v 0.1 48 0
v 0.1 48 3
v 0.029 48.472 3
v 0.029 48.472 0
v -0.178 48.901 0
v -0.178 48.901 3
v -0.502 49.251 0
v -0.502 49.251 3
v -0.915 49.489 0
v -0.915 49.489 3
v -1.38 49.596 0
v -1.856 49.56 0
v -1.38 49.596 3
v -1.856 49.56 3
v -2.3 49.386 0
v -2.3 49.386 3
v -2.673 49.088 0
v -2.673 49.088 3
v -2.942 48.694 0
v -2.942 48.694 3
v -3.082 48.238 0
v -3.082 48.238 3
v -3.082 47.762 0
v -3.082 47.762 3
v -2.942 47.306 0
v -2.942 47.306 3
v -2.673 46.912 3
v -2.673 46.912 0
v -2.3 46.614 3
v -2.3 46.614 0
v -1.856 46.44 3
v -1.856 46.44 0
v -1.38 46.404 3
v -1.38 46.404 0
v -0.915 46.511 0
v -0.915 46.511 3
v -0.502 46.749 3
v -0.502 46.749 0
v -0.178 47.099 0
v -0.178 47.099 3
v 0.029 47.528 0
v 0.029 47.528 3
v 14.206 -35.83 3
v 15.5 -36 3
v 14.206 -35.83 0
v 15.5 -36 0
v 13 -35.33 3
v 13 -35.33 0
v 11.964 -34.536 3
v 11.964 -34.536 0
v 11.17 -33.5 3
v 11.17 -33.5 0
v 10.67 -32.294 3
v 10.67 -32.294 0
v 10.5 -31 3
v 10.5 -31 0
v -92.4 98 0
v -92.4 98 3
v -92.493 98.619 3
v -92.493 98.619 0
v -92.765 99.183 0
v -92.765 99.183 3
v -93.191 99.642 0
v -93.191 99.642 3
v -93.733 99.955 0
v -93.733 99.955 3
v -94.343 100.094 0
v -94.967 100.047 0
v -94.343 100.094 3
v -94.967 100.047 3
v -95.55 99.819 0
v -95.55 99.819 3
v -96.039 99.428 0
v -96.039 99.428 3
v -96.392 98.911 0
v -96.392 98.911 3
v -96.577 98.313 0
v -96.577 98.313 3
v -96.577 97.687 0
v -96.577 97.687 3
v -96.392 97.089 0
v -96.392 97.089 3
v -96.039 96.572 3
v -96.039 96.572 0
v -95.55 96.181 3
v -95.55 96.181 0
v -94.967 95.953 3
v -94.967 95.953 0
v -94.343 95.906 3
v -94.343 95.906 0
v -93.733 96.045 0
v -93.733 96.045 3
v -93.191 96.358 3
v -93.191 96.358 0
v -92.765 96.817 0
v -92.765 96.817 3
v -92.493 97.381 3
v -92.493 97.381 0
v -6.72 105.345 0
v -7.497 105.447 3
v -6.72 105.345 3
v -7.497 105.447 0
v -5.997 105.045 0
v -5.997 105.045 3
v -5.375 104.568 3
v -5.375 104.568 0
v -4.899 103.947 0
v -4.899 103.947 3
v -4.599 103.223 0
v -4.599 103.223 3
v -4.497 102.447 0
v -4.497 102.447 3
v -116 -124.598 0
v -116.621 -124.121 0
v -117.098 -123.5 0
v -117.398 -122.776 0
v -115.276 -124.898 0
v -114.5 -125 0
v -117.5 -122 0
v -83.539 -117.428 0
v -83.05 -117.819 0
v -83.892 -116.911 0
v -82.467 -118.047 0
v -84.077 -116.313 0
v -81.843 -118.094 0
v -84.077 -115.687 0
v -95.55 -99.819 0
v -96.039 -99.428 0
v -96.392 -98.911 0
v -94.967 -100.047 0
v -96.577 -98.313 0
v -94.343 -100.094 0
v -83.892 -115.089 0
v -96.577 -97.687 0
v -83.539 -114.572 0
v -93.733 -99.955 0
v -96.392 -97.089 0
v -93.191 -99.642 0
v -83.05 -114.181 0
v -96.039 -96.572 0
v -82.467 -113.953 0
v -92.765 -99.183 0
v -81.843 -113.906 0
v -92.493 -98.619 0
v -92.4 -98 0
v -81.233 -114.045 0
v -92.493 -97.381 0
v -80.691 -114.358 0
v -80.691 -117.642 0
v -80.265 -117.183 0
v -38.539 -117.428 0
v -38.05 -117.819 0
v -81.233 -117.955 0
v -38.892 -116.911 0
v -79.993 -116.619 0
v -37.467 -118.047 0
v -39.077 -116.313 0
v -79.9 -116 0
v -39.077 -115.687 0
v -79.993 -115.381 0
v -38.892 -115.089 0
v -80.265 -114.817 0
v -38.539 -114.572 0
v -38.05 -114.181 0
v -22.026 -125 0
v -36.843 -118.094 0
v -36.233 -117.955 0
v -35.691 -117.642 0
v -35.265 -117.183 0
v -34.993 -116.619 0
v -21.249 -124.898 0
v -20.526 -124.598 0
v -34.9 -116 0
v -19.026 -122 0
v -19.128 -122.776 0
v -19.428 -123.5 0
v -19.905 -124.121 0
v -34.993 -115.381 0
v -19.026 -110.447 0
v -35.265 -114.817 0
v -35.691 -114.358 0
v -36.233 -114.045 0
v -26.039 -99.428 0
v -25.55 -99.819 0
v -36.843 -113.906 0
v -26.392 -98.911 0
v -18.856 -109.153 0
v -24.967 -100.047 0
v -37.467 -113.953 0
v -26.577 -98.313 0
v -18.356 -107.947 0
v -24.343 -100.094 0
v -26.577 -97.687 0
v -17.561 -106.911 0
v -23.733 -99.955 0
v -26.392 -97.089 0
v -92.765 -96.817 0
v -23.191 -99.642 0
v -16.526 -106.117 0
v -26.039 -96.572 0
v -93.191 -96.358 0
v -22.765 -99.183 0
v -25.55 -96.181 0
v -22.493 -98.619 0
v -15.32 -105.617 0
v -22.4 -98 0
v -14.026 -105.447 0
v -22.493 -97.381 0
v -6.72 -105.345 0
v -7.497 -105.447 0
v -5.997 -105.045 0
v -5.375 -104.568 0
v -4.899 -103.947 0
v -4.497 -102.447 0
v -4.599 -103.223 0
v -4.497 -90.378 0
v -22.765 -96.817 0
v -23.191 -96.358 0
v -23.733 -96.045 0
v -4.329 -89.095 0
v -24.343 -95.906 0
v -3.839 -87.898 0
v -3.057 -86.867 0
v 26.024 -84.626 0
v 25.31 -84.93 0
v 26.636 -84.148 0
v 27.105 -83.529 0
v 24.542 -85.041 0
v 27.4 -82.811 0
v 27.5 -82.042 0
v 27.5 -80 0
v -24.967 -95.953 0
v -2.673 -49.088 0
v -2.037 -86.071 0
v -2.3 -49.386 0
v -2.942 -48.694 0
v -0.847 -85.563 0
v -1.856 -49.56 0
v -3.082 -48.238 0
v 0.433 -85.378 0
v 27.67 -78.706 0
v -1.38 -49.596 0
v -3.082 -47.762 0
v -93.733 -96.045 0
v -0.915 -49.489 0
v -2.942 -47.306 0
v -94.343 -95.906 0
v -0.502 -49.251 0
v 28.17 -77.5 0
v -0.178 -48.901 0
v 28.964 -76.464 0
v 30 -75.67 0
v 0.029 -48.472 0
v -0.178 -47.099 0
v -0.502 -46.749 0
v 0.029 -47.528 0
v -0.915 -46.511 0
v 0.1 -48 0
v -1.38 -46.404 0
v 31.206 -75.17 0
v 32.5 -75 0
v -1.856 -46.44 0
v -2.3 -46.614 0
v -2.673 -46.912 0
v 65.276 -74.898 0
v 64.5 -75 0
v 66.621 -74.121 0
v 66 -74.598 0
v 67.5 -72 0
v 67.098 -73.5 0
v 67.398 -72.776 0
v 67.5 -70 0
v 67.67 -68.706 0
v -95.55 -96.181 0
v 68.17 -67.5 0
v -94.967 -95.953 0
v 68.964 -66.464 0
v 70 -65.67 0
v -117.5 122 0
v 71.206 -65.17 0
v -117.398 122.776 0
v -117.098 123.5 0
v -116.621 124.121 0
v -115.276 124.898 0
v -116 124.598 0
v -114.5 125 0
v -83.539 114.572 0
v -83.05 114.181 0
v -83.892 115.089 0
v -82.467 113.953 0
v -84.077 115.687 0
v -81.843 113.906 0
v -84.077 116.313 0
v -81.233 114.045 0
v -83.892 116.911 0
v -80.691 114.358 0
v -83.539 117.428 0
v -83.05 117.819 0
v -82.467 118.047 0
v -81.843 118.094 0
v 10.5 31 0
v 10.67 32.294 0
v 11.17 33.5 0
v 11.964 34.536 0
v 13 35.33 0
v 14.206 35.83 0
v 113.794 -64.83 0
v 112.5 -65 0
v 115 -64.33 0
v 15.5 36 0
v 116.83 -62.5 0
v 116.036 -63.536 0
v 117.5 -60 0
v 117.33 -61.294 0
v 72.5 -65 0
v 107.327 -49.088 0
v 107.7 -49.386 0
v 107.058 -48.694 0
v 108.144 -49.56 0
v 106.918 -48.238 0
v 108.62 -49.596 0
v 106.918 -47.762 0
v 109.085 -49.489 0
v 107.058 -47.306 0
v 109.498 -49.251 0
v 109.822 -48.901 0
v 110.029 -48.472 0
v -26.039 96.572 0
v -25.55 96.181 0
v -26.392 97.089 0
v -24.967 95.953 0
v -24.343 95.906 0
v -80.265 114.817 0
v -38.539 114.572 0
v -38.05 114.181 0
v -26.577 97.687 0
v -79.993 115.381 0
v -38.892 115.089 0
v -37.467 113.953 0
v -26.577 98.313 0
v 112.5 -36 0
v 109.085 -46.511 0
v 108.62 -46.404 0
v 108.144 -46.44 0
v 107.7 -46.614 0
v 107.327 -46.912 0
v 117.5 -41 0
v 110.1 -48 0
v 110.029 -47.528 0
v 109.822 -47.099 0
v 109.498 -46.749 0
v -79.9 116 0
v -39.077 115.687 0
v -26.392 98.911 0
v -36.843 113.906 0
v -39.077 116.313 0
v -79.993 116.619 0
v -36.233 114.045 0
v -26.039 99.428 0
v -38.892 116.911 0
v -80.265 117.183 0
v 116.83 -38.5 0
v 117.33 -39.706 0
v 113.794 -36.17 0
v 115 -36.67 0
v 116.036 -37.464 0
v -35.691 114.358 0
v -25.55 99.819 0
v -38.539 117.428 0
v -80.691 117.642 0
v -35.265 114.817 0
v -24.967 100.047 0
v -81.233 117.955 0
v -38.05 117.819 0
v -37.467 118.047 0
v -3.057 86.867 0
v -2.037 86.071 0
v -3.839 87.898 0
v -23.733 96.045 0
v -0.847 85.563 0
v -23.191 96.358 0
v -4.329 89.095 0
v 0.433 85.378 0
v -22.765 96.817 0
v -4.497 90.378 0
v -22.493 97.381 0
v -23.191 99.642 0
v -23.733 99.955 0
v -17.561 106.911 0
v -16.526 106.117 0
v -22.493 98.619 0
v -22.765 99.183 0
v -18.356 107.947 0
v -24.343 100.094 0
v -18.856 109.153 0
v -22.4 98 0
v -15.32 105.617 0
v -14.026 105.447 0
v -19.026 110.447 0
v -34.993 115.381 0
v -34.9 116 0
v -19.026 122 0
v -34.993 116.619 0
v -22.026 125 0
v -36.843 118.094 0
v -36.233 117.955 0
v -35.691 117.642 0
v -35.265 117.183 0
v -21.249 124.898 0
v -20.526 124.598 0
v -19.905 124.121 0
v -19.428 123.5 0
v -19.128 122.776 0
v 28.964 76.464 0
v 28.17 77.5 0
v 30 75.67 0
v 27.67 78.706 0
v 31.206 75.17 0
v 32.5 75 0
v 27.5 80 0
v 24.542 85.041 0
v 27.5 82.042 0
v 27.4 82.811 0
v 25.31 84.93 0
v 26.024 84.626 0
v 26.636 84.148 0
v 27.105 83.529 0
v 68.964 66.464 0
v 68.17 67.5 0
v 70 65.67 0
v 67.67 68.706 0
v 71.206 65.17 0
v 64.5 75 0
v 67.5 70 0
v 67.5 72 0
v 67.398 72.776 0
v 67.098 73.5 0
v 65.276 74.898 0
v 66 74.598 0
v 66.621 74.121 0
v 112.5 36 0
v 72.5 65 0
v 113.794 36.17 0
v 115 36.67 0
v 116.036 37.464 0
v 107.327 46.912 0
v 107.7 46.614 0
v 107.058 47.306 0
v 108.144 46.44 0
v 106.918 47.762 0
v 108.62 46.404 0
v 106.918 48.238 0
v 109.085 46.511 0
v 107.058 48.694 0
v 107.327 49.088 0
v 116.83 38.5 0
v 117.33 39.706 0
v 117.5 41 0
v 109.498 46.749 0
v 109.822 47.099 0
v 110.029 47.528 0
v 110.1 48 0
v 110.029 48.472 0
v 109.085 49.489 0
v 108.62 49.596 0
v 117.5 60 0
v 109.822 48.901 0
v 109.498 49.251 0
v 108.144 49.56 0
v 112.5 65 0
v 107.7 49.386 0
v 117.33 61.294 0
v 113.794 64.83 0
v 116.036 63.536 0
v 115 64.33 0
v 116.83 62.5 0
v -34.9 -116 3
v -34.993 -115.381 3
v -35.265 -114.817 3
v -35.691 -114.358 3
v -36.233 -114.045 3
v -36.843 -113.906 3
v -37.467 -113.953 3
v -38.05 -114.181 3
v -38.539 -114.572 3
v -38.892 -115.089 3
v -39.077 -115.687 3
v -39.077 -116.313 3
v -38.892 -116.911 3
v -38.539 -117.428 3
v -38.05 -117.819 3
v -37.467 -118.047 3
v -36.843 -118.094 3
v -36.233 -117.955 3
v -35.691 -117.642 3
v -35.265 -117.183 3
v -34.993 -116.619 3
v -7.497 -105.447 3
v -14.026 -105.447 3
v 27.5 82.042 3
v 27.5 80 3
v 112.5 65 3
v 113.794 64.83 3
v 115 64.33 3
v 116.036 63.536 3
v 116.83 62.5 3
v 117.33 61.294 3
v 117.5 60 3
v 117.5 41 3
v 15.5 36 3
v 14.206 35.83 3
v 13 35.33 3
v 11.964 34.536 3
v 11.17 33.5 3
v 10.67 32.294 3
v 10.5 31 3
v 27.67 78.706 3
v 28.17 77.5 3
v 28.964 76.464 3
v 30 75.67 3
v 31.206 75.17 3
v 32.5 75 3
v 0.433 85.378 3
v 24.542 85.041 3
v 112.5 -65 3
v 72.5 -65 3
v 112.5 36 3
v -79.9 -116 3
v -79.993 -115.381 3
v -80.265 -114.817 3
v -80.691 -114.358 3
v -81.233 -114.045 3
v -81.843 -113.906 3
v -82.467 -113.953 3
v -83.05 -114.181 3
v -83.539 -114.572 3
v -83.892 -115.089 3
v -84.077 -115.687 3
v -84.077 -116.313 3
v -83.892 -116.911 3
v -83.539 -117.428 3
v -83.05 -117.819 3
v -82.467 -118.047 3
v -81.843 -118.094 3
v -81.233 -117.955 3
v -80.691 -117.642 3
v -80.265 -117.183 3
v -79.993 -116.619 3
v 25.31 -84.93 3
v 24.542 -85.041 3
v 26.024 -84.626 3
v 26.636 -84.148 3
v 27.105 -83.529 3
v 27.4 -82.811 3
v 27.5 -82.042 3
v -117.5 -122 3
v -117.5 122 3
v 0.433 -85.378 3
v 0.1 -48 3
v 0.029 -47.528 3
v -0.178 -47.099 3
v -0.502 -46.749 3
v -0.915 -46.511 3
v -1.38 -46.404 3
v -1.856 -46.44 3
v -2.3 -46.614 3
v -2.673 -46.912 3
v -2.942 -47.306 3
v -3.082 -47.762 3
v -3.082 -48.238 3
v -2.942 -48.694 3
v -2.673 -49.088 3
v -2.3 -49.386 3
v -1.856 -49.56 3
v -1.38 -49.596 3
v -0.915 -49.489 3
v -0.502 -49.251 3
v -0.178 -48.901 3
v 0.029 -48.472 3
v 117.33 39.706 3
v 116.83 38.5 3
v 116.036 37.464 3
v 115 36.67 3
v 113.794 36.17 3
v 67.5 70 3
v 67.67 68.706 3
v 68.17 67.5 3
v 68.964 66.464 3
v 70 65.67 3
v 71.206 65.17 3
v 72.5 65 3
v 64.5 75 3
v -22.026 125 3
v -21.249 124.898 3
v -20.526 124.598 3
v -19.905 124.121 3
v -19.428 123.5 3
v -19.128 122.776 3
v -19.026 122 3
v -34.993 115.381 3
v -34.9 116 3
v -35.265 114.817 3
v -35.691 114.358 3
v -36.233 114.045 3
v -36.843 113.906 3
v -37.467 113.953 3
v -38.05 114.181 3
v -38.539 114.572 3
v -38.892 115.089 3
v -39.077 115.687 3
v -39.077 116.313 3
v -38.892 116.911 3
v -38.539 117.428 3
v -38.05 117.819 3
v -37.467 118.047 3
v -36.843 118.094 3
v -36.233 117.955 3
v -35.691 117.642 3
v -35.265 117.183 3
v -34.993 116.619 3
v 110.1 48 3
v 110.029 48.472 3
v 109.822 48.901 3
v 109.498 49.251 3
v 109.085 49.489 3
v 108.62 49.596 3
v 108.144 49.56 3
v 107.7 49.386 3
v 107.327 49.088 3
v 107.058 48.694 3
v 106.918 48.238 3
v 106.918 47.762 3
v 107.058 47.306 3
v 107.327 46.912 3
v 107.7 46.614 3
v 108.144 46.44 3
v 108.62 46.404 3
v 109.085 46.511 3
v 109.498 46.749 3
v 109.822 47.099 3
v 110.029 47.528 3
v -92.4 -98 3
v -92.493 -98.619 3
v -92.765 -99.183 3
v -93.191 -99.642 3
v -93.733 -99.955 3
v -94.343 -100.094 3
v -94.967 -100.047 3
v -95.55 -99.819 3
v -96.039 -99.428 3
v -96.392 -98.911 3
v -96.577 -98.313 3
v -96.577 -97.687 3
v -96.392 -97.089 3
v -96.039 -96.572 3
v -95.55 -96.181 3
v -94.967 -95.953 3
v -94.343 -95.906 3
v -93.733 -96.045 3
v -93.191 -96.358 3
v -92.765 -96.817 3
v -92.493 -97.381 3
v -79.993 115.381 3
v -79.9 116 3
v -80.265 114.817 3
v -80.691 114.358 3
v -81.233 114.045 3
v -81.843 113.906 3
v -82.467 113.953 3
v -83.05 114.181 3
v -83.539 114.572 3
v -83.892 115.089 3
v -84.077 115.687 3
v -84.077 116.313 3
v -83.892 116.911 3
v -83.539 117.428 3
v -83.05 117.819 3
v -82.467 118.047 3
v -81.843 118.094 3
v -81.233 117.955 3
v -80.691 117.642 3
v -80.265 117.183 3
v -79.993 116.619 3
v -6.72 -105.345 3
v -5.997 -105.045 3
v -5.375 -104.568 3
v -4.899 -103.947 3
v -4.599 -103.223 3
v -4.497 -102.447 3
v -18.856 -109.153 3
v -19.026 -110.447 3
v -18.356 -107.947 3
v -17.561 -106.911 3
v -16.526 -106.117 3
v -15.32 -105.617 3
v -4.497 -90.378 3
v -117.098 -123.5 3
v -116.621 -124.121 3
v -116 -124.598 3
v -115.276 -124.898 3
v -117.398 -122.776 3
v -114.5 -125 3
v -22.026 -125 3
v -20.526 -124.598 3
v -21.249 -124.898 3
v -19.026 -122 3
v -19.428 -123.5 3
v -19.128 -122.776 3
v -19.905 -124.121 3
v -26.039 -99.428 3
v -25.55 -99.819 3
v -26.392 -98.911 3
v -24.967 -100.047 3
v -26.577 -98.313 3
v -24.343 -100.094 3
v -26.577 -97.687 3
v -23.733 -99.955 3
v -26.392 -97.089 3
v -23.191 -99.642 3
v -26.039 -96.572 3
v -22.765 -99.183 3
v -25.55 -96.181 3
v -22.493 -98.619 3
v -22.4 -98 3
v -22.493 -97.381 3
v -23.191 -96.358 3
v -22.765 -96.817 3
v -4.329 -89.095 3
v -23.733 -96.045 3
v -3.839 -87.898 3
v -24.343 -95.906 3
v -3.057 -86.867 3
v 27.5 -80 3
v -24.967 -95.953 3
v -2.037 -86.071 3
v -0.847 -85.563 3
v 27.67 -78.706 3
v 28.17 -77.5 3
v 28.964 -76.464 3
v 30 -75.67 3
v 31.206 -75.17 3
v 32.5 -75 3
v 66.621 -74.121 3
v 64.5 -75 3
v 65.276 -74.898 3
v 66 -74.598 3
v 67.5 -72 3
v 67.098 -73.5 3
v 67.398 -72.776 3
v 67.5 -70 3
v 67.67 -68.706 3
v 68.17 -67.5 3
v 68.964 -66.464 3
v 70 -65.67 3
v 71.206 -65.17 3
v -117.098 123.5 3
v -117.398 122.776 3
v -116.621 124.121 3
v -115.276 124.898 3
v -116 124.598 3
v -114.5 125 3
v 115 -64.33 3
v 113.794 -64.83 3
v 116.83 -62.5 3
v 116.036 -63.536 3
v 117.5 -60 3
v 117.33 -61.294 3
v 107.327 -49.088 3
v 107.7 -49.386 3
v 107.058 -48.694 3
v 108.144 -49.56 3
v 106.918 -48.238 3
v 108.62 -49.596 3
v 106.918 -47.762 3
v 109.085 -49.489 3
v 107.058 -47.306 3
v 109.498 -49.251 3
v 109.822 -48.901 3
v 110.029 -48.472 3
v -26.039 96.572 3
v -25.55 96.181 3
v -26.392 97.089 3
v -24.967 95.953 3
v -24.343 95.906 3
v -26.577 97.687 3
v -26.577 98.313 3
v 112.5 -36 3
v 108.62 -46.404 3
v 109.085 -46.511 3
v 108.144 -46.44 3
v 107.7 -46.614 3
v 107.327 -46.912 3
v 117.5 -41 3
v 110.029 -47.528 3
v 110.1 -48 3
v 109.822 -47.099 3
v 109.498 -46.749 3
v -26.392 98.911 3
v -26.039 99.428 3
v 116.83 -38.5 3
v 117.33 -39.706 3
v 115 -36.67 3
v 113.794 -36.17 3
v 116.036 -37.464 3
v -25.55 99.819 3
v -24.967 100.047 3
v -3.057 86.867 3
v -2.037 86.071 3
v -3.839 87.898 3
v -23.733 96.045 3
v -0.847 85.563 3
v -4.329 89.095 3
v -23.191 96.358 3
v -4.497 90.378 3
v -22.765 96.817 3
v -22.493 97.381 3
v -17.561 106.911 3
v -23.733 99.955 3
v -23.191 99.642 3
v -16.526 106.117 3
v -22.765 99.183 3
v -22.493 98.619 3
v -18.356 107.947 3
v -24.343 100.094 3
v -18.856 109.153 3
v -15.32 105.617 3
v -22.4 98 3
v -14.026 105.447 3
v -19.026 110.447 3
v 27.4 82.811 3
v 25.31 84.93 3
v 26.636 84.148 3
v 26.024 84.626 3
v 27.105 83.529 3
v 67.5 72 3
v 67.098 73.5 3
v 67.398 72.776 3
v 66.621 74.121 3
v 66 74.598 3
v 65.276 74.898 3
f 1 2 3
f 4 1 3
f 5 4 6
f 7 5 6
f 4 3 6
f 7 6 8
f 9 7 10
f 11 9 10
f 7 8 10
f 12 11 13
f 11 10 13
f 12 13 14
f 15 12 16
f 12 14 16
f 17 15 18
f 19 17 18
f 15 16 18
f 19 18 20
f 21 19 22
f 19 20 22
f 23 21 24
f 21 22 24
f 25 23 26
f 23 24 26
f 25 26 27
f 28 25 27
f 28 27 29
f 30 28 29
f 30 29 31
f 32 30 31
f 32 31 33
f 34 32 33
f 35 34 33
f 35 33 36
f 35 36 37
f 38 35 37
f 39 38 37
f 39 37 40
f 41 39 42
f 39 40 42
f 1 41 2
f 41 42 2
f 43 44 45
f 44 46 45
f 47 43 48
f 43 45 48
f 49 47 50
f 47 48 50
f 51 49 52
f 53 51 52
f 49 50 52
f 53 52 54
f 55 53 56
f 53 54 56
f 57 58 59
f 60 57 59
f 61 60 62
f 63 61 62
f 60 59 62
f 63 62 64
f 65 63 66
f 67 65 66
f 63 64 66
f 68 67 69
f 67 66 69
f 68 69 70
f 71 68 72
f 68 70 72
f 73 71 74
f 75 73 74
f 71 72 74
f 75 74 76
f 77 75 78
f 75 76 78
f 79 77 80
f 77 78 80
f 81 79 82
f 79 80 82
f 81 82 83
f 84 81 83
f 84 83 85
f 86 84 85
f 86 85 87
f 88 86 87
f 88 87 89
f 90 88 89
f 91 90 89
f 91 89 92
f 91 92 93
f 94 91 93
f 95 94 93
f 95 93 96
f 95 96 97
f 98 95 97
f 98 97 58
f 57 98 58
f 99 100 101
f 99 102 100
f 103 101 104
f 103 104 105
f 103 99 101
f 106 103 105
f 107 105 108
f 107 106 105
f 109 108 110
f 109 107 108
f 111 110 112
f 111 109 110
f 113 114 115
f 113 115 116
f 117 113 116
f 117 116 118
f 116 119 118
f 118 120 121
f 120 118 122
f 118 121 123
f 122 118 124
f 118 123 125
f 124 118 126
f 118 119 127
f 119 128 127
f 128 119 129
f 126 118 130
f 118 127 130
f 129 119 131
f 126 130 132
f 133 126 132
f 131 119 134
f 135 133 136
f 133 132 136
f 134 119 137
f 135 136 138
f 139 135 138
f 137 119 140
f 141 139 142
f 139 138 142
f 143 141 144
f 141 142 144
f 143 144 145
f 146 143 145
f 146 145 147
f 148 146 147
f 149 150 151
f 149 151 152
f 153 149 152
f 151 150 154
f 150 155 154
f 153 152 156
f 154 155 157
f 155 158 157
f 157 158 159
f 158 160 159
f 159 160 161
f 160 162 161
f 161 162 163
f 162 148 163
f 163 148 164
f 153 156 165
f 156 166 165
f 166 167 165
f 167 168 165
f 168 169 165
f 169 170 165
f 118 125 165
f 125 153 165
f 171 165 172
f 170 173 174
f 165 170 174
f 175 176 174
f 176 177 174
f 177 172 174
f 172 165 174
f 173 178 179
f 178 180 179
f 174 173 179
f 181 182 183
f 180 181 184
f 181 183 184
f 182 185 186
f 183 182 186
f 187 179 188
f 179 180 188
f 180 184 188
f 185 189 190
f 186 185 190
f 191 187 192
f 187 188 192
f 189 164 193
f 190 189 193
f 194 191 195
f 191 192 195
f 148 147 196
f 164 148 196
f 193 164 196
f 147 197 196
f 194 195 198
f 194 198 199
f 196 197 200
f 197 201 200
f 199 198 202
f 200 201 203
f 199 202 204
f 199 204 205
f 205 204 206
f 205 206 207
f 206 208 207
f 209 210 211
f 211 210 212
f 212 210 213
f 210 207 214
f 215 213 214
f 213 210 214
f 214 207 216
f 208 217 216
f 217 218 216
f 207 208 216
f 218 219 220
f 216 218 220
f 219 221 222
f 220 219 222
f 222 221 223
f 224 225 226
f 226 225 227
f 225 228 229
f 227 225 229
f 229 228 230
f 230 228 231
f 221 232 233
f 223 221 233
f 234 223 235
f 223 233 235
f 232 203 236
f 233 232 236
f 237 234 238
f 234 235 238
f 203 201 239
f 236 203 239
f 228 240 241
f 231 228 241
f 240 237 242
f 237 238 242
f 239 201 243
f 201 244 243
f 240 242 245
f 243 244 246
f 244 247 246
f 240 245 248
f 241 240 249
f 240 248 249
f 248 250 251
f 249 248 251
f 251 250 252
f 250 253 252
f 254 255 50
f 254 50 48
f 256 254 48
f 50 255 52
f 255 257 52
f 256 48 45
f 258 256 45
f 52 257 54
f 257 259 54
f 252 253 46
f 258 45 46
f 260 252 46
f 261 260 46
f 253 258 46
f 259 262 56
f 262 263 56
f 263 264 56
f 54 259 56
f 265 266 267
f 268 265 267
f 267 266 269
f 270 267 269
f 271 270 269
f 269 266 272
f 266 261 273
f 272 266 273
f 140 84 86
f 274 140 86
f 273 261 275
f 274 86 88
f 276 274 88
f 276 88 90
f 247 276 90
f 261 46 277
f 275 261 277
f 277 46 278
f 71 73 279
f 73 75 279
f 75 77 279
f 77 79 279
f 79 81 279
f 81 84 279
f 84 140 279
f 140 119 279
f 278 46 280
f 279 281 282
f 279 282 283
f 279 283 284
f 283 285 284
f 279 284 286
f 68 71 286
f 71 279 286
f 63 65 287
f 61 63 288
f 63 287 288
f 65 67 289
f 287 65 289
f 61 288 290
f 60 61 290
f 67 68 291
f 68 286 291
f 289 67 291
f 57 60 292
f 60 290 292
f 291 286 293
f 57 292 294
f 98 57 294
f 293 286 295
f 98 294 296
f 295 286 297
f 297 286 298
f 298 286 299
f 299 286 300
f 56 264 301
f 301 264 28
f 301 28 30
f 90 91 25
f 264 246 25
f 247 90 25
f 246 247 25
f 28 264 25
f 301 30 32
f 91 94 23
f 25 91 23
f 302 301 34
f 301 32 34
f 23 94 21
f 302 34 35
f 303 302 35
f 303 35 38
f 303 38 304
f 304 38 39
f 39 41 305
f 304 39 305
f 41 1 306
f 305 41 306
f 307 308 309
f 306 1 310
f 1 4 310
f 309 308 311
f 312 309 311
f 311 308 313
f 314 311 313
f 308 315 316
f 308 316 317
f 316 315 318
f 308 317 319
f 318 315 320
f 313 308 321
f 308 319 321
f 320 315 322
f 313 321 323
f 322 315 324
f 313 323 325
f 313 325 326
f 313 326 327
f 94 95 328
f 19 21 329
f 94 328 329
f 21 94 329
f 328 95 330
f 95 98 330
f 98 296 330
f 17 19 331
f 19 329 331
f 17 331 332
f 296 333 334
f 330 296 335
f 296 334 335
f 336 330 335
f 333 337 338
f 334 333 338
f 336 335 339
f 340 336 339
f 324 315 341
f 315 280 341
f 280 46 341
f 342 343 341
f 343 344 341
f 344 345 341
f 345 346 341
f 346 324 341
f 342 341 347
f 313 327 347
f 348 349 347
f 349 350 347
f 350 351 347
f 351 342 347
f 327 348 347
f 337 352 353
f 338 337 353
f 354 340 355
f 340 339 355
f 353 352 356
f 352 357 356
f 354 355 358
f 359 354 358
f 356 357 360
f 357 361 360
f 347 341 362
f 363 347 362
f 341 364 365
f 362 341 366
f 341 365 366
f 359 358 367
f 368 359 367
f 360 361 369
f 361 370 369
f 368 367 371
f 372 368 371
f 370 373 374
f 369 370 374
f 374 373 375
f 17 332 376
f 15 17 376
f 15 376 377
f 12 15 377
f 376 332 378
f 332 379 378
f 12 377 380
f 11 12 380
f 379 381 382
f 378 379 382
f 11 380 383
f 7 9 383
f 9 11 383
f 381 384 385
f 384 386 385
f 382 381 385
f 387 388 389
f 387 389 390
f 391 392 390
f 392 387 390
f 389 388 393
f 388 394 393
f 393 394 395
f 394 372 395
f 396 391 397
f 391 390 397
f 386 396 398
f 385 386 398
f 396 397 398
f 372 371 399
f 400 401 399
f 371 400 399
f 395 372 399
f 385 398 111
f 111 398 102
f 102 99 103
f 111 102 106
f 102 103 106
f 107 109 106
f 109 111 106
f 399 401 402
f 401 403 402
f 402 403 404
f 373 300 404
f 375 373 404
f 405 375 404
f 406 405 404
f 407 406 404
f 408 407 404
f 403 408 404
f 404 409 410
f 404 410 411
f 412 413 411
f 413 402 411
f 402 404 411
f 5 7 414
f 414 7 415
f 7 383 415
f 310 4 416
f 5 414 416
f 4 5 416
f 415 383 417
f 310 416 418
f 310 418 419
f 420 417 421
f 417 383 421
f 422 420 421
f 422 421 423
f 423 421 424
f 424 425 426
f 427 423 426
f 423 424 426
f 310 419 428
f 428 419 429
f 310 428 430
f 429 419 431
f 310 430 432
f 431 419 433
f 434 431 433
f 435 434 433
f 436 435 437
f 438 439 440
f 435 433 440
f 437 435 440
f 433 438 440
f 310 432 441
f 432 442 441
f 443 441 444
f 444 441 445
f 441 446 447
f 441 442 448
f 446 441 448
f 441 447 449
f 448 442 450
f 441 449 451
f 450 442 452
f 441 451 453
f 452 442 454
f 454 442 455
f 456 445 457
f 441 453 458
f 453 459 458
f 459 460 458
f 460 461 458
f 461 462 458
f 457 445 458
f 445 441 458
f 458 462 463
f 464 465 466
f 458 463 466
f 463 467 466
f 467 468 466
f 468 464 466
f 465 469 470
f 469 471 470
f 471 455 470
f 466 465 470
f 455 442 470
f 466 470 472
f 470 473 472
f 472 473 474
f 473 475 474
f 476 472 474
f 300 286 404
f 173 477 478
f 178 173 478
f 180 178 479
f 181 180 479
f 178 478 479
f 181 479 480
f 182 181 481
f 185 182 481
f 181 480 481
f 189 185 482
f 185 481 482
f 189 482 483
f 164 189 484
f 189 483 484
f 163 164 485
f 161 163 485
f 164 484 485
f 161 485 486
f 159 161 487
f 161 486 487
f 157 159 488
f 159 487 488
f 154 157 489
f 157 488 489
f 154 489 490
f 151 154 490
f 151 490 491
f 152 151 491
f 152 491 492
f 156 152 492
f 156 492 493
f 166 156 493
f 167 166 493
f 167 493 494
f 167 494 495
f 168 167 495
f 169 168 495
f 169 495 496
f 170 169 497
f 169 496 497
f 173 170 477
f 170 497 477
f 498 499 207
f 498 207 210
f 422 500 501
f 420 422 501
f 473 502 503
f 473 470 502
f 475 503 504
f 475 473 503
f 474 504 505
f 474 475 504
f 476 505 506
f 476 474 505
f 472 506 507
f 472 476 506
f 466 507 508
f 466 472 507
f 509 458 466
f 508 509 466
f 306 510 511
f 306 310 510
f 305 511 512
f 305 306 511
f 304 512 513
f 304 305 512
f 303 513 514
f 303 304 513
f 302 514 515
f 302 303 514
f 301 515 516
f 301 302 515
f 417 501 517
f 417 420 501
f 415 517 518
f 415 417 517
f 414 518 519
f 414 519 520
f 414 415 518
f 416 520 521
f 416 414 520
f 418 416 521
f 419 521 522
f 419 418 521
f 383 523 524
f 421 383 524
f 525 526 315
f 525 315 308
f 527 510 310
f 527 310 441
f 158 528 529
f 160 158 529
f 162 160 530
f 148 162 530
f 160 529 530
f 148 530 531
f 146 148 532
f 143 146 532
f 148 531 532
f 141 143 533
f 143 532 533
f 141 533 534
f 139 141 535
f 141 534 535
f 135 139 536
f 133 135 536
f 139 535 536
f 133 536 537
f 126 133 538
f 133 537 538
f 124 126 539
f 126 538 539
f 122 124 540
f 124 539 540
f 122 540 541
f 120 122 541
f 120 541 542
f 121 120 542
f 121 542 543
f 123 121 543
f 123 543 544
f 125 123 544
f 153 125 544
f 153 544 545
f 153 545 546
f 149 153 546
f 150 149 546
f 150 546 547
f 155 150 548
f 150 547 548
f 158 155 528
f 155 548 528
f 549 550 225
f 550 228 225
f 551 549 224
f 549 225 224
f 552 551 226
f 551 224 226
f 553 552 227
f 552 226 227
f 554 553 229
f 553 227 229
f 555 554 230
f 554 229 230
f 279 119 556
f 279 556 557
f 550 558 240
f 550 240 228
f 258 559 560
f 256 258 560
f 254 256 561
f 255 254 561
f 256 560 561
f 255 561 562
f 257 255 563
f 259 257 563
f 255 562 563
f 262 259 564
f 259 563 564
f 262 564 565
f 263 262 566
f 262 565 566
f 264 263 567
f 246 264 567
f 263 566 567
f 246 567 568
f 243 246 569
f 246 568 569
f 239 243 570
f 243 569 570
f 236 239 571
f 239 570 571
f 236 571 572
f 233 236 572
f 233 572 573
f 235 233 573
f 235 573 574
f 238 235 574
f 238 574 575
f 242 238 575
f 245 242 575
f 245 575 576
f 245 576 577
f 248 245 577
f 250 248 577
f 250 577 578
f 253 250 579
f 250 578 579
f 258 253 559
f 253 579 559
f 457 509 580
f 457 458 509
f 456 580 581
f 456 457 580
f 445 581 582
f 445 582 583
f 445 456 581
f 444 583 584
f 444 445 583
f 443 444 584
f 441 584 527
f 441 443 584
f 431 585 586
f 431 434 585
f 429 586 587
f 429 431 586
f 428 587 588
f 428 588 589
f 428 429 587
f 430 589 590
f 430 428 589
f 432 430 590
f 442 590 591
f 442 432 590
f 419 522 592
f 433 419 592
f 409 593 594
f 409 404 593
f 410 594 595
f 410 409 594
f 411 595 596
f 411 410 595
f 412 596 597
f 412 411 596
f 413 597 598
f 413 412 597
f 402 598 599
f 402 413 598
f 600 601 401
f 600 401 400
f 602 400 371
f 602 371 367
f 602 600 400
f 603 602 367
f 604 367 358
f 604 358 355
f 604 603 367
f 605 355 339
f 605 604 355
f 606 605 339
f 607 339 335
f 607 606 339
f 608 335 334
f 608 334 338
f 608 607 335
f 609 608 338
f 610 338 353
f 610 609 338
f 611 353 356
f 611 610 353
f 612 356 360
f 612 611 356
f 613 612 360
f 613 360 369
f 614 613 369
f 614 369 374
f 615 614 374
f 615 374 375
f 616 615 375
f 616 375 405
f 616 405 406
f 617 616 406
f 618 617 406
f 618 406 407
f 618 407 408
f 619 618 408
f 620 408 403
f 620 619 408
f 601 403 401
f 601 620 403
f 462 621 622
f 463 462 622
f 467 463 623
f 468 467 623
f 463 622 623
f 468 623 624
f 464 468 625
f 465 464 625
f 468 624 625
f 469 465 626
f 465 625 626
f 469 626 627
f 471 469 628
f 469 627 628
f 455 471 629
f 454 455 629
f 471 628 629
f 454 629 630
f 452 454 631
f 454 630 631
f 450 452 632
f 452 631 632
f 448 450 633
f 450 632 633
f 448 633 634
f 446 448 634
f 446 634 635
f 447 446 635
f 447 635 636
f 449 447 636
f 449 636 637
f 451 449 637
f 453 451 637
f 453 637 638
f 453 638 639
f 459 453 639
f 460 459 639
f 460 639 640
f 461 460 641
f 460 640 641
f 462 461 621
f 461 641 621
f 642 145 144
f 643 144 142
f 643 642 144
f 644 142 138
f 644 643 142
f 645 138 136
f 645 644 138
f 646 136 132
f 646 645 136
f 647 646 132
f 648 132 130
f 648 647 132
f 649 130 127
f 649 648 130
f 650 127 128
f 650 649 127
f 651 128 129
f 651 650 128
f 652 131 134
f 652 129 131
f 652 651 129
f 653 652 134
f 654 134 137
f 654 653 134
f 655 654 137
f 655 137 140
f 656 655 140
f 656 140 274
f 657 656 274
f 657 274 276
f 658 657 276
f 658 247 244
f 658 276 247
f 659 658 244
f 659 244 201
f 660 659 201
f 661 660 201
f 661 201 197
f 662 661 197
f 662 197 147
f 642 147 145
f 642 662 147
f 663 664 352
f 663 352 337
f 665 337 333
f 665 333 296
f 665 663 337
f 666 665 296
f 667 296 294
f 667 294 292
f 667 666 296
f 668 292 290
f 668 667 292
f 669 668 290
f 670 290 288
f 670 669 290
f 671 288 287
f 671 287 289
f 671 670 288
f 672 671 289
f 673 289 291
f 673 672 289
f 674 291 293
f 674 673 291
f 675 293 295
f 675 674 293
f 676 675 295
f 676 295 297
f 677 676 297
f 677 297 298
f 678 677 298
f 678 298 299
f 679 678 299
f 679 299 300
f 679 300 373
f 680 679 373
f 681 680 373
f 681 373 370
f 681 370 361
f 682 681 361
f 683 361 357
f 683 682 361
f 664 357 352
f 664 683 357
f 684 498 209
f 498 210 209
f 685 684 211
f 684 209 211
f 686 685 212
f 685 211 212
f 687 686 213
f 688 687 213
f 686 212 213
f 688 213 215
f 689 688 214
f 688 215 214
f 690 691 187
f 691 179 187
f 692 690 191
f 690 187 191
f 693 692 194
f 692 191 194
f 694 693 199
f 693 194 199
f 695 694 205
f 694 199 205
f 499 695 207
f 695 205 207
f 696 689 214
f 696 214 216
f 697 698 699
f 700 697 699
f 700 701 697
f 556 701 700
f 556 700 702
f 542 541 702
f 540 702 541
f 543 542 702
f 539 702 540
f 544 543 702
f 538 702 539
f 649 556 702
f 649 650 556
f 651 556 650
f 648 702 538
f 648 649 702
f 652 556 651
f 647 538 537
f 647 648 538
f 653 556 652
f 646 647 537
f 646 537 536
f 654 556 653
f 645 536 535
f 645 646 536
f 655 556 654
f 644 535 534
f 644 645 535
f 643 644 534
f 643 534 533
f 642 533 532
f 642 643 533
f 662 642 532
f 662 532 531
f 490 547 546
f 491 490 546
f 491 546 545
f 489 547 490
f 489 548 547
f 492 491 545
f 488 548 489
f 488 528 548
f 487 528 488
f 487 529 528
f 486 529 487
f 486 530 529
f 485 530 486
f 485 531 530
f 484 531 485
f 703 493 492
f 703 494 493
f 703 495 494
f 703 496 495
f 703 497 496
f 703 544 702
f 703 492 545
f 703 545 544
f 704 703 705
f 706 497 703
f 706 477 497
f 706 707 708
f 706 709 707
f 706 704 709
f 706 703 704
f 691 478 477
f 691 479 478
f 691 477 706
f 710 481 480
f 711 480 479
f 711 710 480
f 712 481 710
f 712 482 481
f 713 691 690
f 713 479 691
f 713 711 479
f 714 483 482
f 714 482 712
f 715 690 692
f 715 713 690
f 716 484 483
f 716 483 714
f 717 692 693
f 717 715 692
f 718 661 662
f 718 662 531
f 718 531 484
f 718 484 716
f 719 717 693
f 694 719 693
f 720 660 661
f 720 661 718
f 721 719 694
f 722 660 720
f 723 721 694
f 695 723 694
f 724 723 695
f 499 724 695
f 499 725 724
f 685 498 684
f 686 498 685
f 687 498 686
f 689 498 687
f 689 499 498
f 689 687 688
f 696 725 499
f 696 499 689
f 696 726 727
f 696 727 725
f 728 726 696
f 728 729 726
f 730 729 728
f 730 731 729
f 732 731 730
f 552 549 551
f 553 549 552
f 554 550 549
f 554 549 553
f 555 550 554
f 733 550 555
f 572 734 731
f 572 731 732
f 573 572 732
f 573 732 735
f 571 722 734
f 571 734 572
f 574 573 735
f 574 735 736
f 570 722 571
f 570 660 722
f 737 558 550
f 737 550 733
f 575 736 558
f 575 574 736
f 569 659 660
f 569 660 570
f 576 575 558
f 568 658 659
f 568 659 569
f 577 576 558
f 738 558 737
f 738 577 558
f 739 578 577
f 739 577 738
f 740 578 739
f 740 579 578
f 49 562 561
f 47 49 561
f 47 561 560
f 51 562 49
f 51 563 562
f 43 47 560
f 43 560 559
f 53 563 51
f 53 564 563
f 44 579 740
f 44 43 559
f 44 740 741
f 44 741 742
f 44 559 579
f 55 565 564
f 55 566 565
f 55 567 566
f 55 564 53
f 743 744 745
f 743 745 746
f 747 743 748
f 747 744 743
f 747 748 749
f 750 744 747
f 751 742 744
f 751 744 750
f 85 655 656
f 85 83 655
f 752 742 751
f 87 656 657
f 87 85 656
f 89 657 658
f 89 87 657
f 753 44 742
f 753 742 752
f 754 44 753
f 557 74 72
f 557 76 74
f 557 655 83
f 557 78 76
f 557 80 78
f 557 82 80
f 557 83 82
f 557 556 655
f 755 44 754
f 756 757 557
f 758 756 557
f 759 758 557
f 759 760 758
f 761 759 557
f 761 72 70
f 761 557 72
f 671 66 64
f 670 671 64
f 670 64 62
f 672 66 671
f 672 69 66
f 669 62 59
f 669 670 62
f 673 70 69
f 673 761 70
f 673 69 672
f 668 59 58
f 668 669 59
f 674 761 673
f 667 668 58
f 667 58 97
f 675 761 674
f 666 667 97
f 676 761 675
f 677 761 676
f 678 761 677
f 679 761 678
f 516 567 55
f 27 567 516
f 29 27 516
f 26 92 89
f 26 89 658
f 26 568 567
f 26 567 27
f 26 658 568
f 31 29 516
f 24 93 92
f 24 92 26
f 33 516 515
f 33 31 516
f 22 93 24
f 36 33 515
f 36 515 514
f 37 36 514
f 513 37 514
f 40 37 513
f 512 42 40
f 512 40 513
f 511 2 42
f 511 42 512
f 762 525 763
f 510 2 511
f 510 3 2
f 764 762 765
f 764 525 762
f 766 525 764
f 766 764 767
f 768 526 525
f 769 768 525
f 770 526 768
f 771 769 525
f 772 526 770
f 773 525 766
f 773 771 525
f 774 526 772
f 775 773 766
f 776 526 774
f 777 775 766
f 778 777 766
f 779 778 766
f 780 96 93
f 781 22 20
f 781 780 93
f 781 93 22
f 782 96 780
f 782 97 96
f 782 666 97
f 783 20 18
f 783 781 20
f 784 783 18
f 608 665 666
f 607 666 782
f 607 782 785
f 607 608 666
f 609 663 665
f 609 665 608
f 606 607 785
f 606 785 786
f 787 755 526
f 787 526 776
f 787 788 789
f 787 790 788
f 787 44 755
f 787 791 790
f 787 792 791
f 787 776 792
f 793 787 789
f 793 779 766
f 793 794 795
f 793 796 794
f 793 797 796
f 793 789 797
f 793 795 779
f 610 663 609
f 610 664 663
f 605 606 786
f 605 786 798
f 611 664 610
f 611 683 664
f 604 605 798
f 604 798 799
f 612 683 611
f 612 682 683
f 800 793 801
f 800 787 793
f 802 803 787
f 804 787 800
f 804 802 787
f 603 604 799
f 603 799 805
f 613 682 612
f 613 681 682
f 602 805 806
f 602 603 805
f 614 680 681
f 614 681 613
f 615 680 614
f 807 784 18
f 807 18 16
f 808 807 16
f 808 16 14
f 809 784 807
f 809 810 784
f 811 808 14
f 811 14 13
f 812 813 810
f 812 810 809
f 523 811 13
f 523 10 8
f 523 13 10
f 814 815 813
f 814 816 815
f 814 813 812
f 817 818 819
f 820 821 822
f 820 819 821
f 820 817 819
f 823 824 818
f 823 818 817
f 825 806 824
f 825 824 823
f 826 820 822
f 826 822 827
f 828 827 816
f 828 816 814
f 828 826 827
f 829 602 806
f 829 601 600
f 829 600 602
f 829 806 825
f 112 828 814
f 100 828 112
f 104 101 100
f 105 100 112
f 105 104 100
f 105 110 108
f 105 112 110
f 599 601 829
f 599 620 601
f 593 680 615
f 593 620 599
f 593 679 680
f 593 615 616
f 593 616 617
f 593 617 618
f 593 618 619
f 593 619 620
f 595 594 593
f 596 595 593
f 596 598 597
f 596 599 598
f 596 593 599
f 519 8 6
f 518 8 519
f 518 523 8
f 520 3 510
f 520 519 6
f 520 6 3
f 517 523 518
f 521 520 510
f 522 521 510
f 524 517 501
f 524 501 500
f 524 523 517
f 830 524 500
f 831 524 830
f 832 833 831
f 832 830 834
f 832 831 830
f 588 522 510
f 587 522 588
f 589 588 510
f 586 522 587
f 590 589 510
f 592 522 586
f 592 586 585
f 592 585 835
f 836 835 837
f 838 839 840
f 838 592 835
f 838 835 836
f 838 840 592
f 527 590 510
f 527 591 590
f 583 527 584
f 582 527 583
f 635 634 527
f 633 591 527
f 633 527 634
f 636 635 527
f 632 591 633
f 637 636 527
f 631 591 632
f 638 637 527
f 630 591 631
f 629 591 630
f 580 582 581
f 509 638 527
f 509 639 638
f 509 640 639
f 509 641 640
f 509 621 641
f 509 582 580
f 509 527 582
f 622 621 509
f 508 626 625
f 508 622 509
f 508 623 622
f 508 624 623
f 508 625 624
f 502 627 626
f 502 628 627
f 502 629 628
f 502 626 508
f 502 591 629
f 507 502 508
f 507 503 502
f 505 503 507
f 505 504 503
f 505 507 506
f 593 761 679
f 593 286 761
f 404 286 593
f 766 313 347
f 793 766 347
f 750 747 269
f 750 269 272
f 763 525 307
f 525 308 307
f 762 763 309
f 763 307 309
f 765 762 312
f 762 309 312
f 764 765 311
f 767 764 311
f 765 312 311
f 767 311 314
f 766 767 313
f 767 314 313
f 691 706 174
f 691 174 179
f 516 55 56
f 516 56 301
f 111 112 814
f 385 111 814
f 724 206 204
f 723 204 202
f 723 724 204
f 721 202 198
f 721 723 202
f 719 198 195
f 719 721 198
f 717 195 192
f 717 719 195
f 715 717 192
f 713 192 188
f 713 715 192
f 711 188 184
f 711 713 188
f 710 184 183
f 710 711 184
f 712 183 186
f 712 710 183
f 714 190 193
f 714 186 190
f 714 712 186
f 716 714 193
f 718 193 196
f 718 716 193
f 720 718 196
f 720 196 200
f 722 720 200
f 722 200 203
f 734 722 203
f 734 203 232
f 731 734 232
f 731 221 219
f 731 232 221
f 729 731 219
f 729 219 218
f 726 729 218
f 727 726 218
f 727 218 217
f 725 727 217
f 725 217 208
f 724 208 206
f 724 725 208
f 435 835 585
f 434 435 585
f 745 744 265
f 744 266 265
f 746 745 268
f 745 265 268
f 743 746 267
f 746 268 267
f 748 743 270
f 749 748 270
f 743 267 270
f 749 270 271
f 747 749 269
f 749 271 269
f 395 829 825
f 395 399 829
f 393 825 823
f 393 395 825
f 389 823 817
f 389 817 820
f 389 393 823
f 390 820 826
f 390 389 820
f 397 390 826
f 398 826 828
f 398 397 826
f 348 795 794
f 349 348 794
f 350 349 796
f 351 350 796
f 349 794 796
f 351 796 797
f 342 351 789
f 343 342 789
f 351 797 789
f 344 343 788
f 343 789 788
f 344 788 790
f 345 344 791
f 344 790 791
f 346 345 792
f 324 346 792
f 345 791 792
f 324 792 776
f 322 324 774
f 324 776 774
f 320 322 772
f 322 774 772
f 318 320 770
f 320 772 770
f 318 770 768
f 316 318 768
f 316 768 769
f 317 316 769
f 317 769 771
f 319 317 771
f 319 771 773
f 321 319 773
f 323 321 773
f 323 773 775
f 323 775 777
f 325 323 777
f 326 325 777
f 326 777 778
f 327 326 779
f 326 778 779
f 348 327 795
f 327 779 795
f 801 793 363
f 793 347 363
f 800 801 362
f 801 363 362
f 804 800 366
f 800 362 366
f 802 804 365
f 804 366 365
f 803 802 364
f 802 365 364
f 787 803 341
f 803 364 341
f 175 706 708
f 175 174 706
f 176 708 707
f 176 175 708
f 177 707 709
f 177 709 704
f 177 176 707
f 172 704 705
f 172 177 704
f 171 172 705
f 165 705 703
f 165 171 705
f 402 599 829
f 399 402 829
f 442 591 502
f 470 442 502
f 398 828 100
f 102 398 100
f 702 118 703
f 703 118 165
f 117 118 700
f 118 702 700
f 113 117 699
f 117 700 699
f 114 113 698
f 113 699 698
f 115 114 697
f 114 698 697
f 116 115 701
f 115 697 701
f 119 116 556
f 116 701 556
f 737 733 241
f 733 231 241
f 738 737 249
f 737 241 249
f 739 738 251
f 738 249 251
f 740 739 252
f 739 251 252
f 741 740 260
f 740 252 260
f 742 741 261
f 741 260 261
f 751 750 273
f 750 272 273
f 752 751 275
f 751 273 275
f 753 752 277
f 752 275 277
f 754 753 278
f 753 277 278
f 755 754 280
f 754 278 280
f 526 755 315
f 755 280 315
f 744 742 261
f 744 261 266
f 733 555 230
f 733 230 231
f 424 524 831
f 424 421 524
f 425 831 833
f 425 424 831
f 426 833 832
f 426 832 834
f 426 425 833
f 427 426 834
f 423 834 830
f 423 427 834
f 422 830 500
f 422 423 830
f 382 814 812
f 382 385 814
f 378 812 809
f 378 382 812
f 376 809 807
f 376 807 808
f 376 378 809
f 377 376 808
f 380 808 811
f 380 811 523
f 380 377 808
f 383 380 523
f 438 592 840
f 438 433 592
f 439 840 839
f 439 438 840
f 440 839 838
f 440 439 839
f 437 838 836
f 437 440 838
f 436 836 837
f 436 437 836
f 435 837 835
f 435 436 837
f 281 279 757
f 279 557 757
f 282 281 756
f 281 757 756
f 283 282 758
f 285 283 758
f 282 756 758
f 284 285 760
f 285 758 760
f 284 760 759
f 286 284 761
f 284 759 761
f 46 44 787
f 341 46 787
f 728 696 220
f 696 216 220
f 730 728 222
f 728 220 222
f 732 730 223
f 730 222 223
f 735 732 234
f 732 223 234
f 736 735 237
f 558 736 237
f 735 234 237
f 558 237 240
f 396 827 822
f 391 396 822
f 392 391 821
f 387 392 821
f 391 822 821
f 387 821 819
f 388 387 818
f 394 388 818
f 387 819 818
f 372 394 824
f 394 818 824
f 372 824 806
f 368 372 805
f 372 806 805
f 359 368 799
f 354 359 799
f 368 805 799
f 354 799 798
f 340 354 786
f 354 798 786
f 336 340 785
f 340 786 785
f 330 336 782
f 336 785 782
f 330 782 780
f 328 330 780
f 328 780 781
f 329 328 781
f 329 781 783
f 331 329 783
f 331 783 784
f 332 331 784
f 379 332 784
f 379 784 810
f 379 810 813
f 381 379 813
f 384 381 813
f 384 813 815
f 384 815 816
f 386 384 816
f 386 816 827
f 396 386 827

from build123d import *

# Parameters (mm, degrees)
SKETCH_1_W          = 235
SKETCH_1_H          = 250
EXTRUDE_1_DEPTH     = 3
SKETCH_2_W          = 107
SKETCH_2_H          = 72
CUT_EXTRUDE_1_DEPTH = 172.581613234
SKETCH_3_R          = 2.1
CUT_EXTRUDE_2_DEPTH = 10
SKETCH_4_R          = 1.6
CUT_EXTRUDE_3_DEPTH = 3
CUT_EXTRUDE_4_DEPTH = 172.581613234
SKETCH_6_R          = 2.1
CUT_EXTRUDE_5_DEPTH = 3
FILLET_1_R          = 5
FILLET_2_R          = 3


with BuildPart() as part:
    # 草图1 → 凸台-拉伸1 (new body)
    with BuildSketch(Plane.XY):
        Rectangle(SKETCH_1_W, SKETCH_1_H)
    extrude(amount=EXTRUDE_1_DEPTH)

    # 草图2 → 切除-拉伸1 (cut, through all)
    with BuildSketch(Plane.XY.offset(3)):
        with Locations((64, 0)):
            Rectangle(SKETCH_2_W, SKETCH_2_H)
    extrude(amount=-CUT_EXTRUDE_1_DEPTH, mode=Mode.SUBTRACT)

    # 草图3 → 切除-拉伸2 (cut)
    with BuildSketch(Plane.XY.offset(3)):
        with Locations((-94.5, 98)):
            Circle(SKETCH_3_R)
        with Locations((-24.5, 98)):
            Circle(SKETCH_3_R)
    cut_extrude_2 = extrude(amount=-CUT_EXTRUDE_2_DEPTH, mode=Mode.SUBTRACT)

    # 镜向1: 切除-拉伸2 across plane
    add(cut_extrude_2.mirror(Plane.ZX), mode=Mode.SUBTRACT)

    # 草图4 → 切除-拉伸3 (cut)
    with BuildSketch(Plane.XY.offset(3)):
        with Locations((108.5, 48)):
            Circle(SKETCH_4_R)
        with Locations((-1.5, 48)):
            Circle(SKETCH_4_R)
        with Locations((108.5, -48)):
            Circle(SKETCH_4_R)
        with Locations((-1.5, -48)):
            Circle(SKETCH_4_R)
    extrude(amount=-CUT_EXTRUDE_3_DEPTH, mode=Mode.SUBTRACT)

    # 草图5 → 切除-拉伸4 (cut, through all)
    with BuildSketch(Plane.XY.offset(3)):
        Polygon((117.5, 125), (27.5, 125), (-4.025914193, 125), (-19.025914193, 125), (-19.025914193, 105.446897357), (-4.496566438, 105.446897357), (-4.496879266, 85.446897359), (27.5, 85), (27.5, 75), (67.5, 75), (67.5, 65), (117.5, 65), align=None)
    cut_extrude_4 = extrude(amount=-CUT_EXTRUDE_4_DEPTH, mode=Mode.SUBTRACT)

    # 镜向2: 切除-拉伸4 across plane
    add(cut_extrude_4.mirror(Plane.ZX), mode=Mode.SUBTRACT)

    # 草图6 → 切除-拉伸5 (cut)
    with BuildSketch(Plane.XY.offset(3)):
        with Locations((-82, -116)):
            Circle(SKETCH_6_R)
        with Locations((-37, -116)):
            Circle(SKETCH_6_R)
    cut_extrude_5 = extrude(amount=-CUT_EXTRUDE_5_DEPTH, mode=Mode.SUBTRACT)

    # 镜向3: 切除-拉伸5 across plane
    add(cut_extrude_5.mirror(Plane.ZX), mode=Mode.SUBTRACT)

    # 圆角1
    fillet_1_edges = [part.edges().sort_by_distance(p)[0] for p in [
        (117.5, -65, 1.5),
        (-19.025914193, -105.446897357, 1.5),
        (-4.496879266, -85.446897359, 1.5),
        (27.5, -75, 1.5),
        (67.5, -65, 1.5),
        (10.5, -36, 1.5),
        (10.5, 36, 1.5),
        (117.5, 36, 1.5),
        (117.5, -36, 1.5),
        (117.5, 65, 1.5),
        (67.5, 65, 1.5),
        (27.5, 75, 1.5),
        (-4.496879266, 85.446897359, 1.5),
        (-19.025914193, 105.446897357, 1.5),
    ]]
    fillet(fillet_1_edges, radius=FILLET_1_R)

    # 圆角2
    fillet_2_edges = [part.edges().sort_by_distance(p)[0] for p in [
        (-19.025914193, -125, 1.5),
        (-4.496566438, -105.446897357, 1.5),
        (27.5, -85, 1.5),
        (67.5, -75, 1.5),
        (-117.5, -125, 1.5),
        (-117.5, 125, 1.5),
        (67.5, 75, 1.5),
        (27.5, 85, 1.5),
        (-4.496566438, 105.446897357, 1.5),
        (-19.025914193, 125, 1.5),
    ]]
    fillet(fillet_2_edges, radius=FILLET_2_R)


solid = part.part
